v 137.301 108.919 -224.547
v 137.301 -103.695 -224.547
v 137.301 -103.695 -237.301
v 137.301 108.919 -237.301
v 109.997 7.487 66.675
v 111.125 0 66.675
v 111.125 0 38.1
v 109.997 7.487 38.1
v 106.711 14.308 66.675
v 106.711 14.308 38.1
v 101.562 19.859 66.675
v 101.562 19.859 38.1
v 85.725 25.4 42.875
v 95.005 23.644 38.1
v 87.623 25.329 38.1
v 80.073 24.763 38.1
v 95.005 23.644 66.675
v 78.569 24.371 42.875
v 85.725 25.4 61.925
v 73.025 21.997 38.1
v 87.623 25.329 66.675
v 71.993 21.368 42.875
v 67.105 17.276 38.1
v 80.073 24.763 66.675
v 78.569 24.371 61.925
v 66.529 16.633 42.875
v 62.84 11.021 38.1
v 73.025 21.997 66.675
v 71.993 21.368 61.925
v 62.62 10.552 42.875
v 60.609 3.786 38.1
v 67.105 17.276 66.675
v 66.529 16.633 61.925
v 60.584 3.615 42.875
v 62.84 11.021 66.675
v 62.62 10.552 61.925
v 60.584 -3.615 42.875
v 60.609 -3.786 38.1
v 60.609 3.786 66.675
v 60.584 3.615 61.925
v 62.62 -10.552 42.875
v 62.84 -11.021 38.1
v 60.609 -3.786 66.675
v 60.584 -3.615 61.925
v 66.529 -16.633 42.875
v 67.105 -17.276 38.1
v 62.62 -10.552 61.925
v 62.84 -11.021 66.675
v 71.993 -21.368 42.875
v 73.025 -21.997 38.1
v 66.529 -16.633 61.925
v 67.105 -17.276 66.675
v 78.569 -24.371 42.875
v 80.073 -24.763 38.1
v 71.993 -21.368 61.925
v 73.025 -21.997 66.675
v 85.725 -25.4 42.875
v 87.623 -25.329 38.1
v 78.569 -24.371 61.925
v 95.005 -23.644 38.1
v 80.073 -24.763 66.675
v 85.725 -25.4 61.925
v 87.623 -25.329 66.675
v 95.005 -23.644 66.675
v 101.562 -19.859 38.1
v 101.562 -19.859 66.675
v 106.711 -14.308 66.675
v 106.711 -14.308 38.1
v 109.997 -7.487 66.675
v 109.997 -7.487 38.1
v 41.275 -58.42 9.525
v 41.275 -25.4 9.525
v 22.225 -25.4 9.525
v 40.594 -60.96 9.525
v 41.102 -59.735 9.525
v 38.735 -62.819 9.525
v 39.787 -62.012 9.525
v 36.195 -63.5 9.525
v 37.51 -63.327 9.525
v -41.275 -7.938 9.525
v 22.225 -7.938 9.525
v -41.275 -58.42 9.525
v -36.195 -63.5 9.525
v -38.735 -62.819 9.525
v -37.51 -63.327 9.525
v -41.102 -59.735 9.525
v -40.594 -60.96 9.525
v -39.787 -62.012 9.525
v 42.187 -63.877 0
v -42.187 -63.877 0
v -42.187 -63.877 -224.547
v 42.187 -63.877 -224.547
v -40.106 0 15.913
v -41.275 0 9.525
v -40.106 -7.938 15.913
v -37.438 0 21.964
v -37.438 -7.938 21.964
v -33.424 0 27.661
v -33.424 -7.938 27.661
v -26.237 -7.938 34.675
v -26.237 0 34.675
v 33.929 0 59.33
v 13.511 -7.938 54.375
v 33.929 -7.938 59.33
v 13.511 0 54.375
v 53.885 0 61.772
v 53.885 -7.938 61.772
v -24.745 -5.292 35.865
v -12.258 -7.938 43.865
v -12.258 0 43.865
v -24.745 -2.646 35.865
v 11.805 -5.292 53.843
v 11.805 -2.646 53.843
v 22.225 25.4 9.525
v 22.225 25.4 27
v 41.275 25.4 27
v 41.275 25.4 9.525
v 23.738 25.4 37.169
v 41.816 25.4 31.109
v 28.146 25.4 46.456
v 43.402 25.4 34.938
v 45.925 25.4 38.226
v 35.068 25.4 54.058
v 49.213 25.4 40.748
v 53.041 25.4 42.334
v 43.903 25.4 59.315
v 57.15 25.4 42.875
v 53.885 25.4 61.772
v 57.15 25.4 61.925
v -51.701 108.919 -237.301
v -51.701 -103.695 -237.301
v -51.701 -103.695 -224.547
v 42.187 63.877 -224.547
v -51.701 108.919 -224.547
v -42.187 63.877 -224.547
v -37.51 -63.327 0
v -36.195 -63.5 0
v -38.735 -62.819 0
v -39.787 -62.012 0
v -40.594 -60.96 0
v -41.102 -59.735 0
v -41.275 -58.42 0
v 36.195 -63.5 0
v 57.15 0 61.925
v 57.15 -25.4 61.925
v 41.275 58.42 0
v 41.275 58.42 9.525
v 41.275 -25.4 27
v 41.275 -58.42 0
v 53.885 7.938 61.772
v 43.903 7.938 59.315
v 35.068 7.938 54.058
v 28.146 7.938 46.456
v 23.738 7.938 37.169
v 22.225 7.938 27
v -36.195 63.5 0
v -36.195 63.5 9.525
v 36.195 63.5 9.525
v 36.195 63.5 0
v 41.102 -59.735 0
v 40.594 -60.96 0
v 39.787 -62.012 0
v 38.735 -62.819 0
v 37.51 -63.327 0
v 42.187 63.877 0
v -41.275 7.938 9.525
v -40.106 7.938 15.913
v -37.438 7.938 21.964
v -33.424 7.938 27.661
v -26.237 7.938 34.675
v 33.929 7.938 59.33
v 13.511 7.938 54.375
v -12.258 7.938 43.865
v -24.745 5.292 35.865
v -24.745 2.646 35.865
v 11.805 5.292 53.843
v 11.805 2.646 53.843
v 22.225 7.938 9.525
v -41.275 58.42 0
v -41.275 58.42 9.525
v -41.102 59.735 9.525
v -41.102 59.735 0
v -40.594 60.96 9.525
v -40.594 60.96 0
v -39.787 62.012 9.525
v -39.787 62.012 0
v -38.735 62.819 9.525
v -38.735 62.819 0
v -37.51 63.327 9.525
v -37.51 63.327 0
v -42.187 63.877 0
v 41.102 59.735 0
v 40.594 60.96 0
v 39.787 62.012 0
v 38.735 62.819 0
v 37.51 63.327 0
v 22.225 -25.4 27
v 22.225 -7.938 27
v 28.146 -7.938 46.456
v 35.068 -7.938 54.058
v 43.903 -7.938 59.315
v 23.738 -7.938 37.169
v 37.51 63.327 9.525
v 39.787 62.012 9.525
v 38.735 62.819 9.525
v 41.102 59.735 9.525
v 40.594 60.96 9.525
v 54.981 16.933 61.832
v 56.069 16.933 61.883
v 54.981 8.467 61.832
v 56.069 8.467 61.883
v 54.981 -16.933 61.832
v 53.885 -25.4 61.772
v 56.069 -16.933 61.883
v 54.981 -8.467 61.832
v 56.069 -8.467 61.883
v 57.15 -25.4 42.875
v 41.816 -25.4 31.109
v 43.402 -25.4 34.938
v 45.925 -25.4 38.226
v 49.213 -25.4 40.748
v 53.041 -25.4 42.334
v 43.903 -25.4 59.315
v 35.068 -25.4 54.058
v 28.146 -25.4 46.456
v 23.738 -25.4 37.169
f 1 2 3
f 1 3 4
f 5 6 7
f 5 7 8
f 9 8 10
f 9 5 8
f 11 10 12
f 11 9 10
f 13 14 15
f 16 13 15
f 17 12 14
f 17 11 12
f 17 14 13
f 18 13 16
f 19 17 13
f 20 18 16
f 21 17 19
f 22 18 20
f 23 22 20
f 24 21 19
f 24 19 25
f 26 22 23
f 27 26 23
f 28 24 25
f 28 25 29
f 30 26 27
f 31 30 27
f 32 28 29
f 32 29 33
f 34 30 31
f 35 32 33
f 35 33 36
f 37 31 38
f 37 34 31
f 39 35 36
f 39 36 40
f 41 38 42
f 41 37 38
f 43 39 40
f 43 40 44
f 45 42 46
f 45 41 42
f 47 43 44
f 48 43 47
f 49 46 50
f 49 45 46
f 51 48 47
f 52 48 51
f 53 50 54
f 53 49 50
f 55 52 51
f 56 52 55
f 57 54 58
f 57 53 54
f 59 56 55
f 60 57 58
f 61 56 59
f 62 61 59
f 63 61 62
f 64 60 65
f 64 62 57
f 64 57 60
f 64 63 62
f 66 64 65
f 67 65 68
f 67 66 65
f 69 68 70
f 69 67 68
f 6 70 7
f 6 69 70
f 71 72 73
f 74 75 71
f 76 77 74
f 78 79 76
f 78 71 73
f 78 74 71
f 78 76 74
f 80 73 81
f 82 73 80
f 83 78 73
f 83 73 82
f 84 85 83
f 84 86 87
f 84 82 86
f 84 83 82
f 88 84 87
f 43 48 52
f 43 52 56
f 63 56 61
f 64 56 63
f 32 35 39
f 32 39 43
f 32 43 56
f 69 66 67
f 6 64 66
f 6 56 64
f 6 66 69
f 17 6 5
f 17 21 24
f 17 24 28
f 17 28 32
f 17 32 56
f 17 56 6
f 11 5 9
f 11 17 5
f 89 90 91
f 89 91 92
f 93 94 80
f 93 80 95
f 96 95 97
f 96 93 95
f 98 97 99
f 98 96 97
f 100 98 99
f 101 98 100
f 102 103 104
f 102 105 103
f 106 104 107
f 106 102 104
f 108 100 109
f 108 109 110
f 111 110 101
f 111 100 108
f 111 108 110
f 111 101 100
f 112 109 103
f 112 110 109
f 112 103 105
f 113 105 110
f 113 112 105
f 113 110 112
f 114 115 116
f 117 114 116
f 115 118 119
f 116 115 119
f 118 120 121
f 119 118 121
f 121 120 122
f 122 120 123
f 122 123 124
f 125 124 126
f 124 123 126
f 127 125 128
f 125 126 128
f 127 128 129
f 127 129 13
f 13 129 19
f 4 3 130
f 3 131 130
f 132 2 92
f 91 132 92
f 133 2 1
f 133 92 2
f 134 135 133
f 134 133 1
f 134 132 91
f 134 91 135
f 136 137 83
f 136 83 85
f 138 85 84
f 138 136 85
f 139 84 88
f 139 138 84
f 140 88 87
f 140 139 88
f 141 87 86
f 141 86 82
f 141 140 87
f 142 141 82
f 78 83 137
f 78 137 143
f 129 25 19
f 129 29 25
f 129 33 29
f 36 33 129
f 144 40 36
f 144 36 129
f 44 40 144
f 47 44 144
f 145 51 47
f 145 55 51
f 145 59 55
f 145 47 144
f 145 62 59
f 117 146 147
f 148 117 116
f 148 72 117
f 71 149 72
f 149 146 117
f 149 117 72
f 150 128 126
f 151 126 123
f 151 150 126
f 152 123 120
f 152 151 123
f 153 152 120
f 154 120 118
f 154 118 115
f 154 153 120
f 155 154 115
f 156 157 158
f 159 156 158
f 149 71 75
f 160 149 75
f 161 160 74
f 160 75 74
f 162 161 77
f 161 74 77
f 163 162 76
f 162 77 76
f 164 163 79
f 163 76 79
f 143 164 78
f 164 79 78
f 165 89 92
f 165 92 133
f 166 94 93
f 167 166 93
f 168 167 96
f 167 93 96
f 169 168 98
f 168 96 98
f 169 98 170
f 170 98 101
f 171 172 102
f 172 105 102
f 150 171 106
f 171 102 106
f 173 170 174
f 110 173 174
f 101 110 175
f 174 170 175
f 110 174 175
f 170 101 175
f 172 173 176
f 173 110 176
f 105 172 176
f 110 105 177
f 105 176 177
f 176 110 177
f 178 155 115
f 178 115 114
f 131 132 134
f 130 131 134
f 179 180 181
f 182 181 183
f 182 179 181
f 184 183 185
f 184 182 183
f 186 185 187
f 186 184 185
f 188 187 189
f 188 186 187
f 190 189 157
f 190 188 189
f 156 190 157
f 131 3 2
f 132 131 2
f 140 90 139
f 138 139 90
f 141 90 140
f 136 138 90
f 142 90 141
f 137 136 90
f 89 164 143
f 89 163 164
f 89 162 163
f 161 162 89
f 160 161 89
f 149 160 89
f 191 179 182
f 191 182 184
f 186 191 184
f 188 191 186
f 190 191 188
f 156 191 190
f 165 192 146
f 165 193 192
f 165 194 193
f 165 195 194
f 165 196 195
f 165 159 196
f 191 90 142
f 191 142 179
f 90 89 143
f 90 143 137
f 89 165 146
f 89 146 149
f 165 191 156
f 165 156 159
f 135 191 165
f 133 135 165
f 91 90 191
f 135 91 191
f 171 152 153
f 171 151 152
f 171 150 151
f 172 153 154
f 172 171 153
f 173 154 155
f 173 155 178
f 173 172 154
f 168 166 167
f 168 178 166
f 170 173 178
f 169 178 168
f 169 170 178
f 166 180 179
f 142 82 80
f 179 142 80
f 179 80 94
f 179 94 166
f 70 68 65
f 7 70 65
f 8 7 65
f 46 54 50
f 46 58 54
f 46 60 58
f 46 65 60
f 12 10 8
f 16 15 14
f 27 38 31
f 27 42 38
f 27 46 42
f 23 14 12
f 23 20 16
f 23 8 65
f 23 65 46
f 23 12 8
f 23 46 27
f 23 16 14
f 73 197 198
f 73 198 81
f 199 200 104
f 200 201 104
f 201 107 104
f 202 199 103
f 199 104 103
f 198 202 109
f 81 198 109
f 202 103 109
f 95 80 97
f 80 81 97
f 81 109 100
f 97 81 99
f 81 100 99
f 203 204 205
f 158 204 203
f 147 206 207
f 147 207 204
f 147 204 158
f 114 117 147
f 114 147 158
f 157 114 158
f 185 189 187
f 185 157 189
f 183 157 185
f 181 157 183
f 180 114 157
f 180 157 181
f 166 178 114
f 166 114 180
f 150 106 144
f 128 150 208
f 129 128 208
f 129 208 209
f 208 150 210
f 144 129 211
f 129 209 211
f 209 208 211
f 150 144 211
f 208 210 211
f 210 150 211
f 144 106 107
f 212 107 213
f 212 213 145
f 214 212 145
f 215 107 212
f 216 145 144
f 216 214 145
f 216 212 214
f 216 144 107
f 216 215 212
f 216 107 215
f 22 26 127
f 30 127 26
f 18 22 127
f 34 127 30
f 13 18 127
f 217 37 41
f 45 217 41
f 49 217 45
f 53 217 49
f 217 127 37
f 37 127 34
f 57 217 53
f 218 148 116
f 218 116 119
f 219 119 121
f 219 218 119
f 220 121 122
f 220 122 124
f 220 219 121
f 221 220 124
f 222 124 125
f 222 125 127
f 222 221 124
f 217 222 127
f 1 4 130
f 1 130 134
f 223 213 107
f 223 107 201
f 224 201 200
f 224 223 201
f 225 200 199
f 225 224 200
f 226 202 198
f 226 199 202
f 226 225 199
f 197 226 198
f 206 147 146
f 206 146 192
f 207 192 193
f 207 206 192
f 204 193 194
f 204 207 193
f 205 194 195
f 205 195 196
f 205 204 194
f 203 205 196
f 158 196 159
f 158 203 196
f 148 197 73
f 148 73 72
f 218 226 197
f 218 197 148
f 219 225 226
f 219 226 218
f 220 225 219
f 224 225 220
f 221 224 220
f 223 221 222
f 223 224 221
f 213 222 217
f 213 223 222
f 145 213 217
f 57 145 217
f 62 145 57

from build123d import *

# Parameters (mm, degrees)
F1_DEPTH  = 63.5
F0_W      = 25.4
F0_H      = 19.05
F2_DEPTH  = 25.4
F3_DEPTH  = 7.9375
F5_R      = 5.08
F6_W      = 84.3743681908
F6_H      = 127.7539134026
F7_DEPTH  = 229.7079414129
F8_W      = 212.6137167215
F8_H      = 12.7539038658
F9_DEPTH  = 51.7011582851
F10_DEPTH = 85.5997037143


# Not quite as in the source:
# - the program builds the solid bodies; features that only make, move or delete a surface that nothing else refers to are left out


with BuildPart() as f1:
    # F0 (on Front) → F1 (new body, symmetric)
    with BuildSketch(Plane.XZ):
        Polygon((22.225, 9.525), (-41.275, 9.525), (-41.275, -9.525), (41.275, -9.525), (41.275, 9.525), align=None)
    extrude(amount=F1_DEPTH, both=True)

    # F0 (on Front) → F2 (join, symmetric)
    with BuildSketch(Plane.XZ):
        with BuildLine():
            Line((22.225, 27.0002), (22.225, 9.525))
            Line((22.225, 9.525), (41.275, 9.525))
            Line((41.275, 9.525), (41.275, 27.0002))
            ThreePointArc((41.275, 27.0002), (45.9246798487, 38.2255201513), (57.15, 42.8752))
            Line((57.15, 42.8752), (60.325, 42.8752))
            Line((60.325, 42.8752), (60.325, 61.9252))
            Line((60.325, 61.9252), (57.15, 61.9252))
            add(Edge.make_bspline(
                [(53.8854342407, 61.7722898912), (54.9842067368, 61.8365871986), (56.0728453275, 61.8876096574), (57.15, 61.9252)],
                knots=[108.5245810491, 108.5245810491, 108.5245810491, 108.5245810491, 111.5045361635, 111.5045361635, 111.5045361635, 111.5045361635], degree=3))
            ThreePointArc((53.8854342407, 61.7722898912), (31.3258777096, 50.5133948686), (22.225, 27.0002))
        make_face()
        with Locations((73.025, 52.4002)):
            Rectangle(F0_W, F0_H)
    extrude(amount=F2_DEPTH, both=True)

    # F0 (on Front) → F3 (join, symmetric)
    with BuildSketch(Plane.XZ):
        with BuildLine():
            add(Edge.make_bspline(
                [(-41.275, 9.525), (-39.5856284224, 39.4828766469), (13.870125209, 59.4306981306), (53.8854342407, 61.7722898912)],
                knots=[0, 0, 0, 0, 108.5245810491, 108.5245810491, 108.5245810491, 108.5245810491], degree=3))
            Line((-41.275, 9.525), (22.225, 9.525))
            Line((22.225, 9.525), (22.225, 27.0002))
            ThreePointArc((22.225, 27.0002), (31.3258777096, 50.5133948686), (53.8854342407, 61.7722898912))
        make_face()
    extrude(amount=F3_DEPTH, both=True)

    # F0 (on Front) → F4 (revolve)
    with BuildSketch(Plane.XZ):
        Polygon((85.725, 66.675), (85.725, 61.9252), (85.725, 42.8752), (85.725, 38.1), (111.125, 38.1), (111.125, 66.675), align=None)
    revolve(axis=Axis((85.725, 0, 52.3875), (0, 0, 1)))

    # F5
    f5_edges = [f1.edges().sort_by_distance(p)[0] for p in [
        (41.275, -63.5, 0),
        (-41.275, -63.5, 0),
        (41.275, 63.5, 0),
        (-41.275, 63.5, 0),
    ]]
    fillet(f5_edges, radius=F5_R)

    # F6 (on Top) → F7 (join)
    with BuildSketch(Plane.XY):
        Rectangle(F6_W, F6_H)
    extrude(amount=-F7_DEPTH)

    # F8 (on Right) → F9 (join, symmetric)
    with BuildSketch(Plane.YZ):
        with Locations((2.6118680835, -230.9240400791)):
            Rectangle(F8_W, F8_H)
    extrude(amount=F9_DEPTH, both=True)

    # F10 (add): a face of the model
    f10_faces = [f1.faces().sort_by_distance(p)[0] for p in [
        (51.7011582851, 2.6118680835, -230.9240400791),
    ]]
    extrude(f10_faces, amount=F10_DEPTH)


solid = f1.part
